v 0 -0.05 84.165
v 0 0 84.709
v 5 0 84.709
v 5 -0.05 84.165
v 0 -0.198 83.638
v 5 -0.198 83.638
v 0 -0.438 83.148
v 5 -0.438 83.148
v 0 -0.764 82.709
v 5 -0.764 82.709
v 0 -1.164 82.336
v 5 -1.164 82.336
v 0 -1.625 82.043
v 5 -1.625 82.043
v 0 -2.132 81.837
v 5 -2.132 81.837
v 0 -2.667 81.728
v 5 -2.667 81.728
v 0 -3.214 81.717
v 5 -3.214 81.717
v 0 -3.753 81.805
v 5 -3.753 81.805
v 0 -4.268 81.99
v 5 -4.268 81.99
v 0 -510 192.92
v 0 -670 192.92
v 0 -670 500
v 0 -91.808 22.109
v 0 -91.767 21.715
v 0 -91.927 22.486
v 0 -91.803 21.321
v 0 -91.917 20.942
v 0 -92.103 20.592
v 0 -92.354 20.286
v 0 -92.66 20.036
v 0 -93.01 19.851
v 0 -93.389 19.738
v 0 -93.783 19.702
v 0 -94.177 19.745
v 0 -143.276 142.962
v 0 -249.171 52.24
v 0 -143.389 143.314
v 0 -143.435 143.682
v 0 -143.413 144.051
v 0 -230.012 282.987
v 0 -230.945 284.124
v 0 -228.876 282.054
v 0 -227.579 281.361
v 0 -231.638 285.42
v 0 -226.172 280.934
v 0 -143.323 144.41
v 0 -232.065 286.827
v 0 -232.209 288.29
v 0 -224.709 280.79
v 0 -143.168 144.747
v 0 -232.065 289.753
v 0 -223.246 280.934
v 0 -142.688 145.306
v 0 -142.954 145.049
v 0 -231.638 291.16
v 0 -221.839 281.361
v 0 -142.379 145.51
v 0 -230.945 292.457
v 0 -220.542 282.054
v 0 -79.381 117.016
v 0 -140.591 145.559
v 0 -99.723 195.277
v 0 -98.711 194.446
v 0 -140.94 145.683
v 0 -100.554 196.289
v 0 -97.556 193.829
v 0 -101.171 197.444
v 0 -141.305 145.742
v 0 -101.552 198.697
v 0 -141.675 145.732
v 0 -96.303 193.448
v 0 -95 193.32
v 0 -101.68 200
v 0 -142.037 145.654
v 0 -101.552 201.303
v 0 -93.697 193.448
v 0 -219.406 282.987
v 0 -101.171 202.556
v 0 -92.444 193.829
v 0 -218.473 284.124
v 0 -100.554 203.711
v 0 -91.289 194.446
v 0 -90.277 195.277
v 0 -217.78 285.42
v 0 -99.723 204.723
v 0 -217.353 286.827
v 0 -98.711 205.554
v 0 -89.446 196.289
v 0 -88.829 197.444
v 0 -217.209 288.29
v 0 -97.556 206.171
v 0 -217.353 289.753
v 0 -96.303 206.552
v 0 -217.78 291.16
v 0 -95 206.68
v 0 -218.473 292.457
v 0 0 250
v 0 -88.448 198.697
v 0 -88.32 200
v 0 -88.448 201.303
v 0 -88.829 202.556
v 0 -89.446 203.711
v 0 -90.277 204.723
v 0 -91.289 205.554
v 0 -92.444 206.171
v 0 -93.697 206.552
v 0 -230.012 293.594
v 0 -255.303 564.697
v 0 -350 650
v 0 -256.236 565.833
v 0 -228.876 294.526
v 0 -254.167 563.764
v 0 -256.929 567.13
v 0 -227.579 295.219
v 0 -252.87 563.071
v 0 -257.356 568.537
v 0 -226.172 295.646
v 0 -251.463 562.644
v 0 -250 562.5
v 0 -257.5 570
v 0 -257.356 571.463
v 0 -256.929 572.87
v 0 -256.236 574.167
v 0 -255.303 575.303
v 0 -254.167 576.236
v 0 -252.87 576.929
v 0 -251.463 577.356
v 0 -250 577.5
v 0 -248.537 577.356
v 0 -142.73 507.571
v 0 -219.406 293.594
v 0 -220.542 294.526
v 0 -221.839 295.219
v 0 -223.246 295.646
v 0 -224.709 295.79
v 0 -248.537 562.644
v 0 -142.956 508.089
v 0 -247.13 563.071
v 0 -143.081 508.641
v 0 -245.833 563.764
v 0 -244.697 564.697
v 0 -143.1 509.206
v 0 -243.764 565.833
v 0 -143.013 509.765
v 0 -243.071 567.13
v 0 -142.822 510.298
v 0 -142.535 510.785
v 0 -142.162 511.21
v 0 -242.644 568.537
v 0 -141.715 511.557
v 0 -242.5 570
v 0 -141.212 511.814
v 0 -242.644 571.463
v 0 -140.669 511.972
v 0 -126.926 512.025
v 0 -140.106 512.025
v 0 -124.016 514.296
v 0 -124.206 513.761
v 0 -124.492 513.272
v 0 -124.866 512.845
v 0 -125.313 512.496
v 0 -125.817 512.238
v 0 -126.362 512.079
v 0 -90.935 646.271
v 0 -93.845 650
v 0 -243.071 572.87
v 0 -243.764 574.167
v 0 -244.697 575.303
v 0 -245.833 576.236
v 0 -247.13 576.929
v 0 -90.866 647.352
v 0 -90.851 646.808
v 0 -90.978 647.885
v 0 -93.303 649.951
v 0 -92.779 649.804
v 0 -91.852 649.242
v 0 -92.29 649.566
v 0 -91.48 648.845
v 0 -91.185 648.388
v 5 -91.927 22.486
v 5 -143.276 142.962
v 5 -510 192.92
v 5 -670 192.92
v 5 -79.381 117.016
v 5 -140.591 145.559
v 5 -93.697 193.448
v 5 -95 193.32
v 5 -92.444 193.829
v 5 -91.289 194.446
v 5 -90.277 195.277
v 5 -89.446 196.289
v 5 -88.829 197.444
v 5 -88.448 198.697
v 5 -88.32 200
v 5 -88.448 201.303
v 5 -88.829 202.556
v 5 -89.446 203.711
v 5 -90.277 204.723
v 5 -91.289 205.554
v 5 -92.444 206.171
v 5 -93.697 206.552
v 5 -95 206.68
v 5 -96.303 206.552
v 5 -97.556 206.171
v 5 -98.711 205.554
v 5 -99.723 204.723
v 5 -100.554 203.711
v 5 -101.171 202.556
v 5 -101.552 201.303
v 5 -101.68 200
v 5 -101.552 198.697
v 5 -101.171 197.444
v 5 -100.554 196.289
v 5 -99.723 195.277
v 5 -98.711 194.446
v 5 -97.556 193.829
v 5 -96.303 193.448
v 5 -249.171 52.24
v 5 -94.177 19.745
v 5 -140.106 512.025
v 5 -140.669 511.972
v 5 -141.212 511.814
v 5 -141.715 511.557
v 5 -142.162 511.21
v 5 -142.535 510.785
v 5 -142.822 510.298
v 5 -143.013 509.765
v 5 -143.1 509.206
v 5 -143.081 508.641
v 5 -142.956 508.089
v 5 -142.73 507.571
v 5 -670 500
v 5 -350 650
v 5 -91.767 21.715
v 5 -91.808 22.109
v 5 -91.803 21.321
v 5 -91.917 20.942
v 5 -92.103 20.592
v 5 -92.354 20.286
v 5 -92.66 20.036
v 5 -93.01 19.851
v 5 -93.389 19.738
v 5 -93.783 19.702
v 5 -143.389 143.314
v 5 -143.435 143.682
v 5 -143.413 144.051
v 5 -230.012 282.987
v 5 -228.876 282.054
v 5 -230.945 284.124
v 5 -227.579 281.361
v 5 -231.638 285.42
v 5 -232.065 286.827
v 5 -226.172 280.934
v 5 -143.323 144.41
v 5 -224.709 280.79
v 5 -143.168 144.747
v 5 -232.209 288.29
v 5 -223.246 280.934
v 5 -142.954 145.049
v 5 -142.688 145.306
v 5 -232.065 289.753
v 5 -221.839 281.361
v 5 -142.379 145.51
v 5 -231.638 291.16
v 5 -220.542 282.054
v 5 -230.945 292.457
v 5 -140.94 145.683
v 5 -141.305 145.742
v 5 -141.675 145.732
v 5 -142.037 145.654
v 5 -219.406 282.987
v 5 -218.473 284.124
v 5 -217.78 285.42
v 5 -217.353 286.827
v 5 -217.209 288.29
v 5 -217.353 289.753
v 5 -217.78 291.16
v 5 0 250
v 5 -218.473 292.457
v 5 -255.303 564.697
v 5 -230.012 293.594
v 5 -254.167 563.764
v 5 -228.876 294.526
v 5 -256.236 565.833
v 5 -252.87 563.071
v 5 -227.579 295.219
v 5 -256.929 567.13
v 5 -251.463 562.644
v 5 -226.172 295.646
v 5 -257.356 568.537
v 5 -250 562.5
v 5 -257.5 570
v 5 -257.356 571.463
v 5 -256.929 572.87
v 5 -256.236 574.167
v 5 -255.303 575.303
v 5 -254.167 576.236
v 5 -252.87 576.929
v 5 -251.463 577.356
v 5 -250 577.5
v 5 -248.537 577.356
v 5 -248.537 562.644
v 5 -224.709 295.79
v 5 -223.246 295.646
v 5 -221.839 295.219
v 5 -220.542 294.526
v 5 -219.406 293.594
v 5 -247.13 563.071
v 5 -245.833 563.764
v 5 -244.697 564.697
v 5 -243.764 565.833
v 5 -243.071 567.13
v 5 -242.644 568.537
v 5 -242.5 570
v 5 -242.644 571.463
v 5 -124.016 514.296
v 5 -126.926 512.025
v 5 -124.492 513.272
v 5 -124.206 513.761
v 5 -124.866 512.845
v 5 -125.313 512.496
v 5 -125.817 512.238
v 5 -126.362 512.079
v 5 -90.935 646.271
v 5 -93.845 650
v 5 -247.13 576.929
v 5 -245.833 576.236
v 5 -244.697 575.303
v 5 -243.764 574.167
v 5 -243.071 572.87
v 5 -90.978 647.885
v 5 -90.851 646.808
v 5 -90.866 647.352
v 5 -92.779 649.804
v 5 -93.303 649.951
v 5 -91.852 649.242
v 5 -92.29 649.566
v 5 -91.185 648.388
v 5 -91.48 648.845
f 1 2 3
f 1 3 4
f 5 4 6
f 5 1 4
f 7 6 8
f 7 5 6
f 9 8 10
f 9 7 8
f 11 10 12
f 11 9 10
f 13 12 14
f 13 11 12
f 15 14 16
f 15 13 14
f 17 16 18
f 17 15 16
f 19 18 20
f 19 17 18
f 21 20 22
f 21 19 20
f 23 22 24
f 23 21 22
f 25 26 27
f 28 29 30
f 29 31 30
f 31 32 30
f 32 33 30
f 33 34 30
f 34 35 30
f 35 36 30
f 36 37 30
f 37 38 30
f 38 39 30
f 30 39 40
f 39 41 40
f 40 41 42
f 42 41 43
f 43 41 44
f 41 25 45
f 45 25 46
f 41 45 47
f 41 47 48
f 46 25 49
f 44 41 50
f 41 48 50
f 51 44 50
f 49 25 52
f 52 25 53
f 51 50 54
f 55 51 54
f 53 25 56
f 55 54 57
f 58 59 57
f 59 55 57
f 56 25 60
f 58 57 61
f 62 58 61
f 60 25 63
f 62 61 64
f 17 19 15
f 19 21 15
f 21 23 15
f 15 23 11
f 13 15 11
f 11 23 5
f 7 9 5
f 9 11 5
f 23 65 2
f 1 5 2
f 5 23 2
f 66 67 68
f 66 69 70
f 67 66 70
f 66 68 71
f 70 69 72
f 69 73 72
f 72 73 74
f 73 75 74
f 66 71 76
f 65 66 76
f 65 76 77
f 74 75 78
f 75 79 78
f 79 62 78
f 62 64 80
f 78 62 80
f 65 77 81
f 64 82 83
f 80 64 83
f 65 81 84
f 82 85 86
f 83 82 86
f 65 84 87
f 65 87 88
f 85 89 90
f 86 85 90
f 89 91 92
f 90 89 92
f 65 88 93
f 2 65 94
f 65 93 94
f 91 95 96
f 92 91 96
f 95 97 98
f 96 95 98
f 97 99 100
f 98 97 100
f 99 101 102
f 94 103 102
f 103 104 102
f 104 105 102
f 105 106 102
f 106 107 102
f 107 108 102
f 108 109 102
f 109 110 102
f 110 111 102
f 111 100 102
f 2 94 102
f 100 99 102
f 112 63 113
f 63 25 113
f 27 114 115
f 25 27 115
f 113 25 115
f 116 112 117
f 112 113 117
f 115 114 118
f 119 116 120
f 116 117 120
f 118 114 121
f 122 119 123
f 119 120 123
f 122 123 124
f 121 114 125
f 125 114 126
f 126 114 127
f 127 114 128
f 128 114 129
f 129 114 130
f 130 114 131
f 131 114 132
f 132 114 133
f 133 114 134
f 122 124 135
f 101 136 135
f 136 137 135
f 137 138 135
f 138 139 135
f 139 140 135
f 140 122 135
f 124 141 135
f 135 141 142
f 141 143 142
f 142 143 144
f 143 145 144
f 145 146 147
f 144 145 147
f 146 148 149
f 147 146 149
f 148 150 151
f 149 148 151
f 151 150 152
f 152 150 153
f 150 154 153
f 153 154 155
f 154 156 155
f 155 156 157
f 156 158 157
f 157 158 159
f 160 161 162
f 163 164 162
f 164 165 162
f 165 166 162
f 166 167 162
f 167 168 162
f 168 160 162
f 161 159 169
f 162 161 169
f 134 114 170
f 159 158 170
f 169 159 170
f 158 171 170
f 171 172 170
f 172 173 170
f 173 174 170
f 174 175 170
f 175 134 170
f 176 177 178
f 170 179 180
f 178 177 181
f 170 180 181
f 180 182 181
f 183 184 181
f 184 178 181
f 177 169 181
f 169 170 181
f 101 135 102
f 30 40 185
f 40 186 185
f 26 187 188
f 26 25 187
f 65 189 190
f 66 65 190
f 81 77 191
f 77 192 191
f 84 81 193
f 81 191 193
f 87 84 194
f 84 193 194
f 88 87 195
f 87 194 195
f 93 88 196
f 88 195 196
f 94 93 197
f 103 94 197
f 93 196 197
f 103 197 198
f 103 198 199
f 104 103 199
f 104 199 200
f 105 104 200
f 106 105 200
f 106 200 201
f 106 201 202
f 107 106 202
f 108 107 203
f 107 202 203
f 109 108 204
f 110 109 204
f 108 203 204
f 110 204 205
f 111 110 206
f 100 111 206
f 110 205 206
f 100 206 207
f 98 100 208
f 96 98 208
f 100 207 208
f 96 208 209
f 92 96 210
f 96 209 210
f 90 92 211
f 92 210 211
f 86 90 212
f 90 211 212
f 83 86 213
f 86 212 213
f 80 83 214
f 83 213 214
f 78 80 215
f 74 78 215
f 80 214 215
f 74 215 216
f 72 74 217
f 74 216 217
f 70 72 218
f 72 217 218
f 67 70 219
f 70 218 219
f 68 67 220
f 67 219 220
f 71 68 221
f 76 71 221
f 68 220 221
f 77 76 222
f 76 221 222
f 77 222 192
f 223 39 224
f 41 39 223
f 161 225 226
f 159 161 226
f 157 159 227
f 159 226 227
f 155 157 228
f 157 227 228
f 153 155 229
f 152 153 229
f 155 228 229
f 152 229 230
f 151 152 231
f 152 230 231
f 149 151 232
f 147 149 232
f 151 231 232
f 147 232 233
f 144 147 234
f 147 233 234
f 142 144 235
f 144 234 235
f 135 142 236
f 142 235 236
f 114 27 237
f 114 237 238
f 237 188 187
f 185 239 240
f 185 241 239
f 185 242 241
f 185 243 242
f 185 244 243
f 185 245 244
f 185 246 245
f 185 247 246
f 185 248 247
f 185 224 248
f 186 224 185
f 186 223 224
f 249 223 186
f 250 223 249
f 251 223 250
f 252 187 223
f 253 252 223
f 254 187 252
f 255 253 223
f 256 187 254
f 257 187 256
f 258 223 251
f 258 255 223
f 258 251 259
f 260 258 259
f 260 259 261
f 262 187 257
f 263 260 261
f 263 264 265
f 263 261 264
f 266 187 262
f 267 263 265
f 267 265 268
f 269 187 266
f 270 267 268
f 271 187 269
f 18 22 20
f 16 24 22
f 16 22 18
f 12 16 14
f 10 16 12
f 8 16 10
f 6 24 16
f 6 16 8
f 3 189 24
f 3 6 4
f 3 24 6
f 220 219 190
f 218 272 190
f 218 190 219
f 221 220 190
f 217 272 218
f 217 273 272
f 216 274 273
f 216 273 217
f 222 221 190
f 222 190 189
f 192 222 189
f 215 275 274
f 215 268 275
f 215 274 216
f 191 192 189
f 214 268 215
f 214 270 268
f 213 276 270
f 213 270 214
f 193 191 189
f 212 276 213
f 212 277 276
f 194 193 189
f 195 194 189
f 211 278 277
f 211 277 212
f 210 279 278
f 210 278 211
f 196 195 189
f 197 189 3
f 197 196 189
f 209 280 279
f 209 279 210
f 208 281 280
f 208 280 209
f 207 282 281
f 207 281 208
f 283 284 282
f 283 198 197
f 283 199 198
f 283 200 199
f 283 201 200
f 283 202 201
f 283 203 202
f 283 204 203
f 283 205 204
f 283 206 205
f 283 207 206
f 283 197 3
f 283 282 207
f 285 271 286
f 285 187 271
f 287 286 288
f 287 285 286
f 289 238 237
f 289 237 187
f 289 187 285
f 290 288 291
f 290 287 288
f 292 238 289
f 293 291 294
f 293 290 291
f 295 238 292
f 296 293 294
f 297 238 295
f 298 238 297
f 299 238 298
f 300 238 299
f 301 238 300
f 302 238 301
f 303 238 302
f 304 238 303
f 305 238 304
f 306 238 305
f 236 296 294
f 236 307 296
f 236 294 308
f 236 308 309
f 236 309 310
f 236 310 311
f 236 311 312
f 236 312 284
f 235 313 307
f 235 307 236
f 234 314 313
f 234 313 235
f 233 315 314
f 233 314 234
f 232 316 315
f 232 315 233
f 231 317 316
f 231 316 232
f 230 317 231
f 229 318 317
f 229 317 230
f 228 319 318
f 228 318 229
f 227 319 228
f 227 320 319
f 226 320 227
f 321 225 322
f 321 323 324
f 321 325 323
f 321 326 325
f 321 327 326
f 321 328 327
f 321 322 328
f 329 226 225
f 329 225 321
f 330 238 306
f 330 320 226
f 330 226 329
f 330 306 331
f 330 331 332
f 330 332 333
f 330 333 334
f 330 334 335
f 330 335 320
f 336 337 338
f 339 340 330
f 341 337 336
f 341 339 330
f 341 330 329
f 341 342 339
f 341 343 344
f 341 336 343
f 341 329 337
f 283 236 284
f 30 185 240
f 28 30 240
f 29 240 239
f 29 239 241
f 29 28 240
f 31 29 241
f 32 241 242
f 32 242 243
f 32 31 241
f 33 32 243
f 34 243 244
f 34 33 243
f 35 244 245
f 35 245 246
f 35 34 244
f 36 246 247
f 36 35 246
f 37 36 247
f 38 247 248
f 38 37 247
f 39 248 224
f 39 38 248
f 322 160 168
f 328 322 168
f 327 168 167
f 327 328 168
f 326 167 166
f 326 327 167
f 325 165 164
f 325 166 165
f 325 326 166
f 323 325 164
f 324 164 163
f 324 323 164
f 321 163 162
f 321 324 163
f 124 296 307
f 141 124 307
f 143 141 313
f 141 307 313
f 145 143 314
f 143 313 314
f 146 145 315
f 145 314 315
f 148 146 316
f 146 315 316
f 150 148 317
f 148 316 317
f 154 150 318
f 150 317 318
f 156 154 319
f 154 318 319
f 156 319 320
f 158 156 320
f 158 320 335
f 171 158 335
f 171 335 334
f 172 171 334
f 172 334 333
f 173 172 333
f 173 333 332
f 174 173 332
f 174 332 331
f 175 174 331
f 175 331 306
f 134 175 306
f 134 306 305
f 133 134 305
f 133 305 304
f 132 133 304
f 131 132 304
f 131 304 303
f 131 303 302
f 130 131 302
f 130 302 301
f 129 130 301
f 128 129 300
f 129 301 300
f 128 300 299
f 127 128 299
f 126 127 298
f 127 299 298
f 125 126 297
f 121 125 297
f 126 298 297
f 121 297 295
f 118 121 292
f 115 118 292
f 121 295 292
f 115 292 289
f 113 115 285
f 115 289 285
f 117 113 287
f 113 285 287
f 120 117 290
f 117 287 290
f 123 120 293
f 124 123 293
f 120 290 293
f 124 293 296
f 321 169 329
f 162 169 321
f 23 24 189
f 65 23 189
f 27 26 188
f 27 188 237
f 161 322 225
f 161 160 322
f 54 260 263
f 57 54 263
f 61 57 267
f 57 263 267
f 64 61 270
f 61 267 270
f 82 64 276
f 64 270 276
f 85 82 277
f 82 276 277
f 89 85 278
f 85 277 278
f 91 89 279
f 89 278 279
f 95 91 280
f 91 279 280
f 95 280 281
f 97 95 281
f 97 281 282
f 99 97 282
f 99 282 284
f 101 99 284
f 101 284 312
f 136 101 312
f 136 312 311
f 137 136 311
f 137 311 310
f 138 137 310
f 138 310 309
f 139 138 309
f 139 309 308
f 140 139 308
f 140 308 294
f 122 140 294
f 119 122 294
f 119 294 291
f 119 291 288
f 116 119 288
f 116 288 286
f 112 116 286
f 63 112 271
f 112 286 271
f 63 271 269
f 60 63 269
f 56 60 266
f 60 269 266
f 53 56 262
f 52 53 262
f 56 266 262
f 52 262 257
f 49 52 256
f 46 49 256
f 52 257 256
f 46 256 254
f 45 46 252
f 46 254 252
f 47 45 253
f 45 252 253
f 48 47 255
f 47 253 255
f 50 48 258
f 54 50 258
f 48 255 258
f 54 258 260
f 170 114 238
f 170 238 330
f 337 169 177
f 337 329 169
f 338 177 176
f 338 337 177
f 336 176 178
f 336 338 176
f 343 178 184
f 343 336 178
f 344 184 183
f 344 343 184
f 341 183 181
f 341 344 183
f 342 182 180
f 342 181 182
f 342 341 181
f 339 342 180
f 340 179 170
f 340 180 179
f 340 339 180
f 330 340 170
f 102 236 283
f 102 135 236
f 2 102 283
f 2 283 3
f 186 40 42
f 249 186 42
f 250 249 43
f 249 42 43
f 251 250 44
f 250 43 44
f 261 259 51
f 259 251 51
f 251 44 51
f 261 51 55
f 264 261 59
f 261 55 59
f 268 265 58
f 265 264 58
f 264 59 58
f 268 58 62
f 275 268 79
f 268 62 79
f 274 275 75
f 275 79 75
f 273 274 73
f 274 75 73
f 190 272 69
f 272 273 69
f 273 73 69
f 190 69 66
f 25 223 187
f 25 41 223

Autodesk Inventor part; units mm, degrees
ref_plane "YZ Plane" through (0, 0, 0) normal (1, 0, 0) x (0, 1, 0)
ref_plane "XZ Plane" through (0, 0, 0) normal (0, 1, 0) x (-1, 0, 0)
ref_plane "XY Plane" through (0, 0, 0) normal (0, 0, 1) x (1, 0, 0)
sketch "スケッチ1" plane through (0, 0, 0) normal (1, 0, 0) x (0, 1, 0)
  line L0 (-670, 192.9198) -> (-670, 500)
  line L1 (-670, 500) -> (-350, 650)
  line L2 (-350, 650) -> (-90, 650)
  line L3 (0, 250) -> (0, 0)
  line L4 (-124.5856, 512.0252) -> (-145.1979, 512.0252)
  line L5 (-145.1979, 512.0252) -> (0, 250)
  line L6 (-90, 650) -> (-124.5856, 512.0252)
  line L7 (-249.1712, 52.2397) -> (-510, 192.9198)
  line L8 (-510, 192.9198) -> (-670, 192.9198)
  line L9 (0, 0) -> (-249.1712, 52.2397)
  dimension "d2" = 150
  dimension "d3" = 320
  dimension "d4" = 250
  dimension "d5" = 670
  dimension "d79" = 260
extrude "押し出し1" add sketch "スケッチ1" along normal blind 5
sketch "スケッチ8" plane through (5, 0, 0) normal (1, 0, 0) x (0, 0, -1)
  circle A0 centre (-570, -250) radius 7.5
  circle A1 centre (-288.2903, -224.7089) radius 7.5
  line L0 (0, 0) -> (-250, 0) projected
  line L1 (-570, -250) -> (-290.3837, -264.6541)
  line L2 (-290.3837, -264.6541) -> (-288.2903, -224.7089)
  line L3 (0, -804) -> (0, 134) projected
  dimension "d65" = 15
  dimension "d66" = 15
  dimension "d77" = 250
  dimension "d88" = 40
  dimension "d89" = 280
  dimension "d90" = 3
  dimension "d91" = 570
extrude "押し出し8" cut sketch "スケッチ8" against normal through all
sketch "スケッチ12" plane through (5, 0, 0) normal (1, 0, 0) x (0, 0, -1)
  circle A0 centre (-200, -95) radius 6.6799
  point P0 (0, 0)
  dimension "d84" = 200
  dimension "d85" = 95
extrude "押し出し11" cut sketch "スケッチ12" against normal through all
sketch "スケッチ13" plane through (5, 0, 0) normal (1, 0, 0) x (0, 0, -1)
  line L0 (0, -804) -> (0, 134) projected
  line L1 (130, 0) -> (-780, 0) projected
  line L2 (-80, 0) -> (-121.7476, -89.528)
  line L3 (-121.7476, -89.528) -> (-1.0516, -5.0157)
  line L4 (-52.2397, -249.1712) -> (0, 0) projected
  dimension "d95" = 80
  dimension "d96" = 115
  dimension "d97" = 30
extrude "押し出し12" cut sketch "スケッチ13" against normal through all
fillet "フィレット2" radius 3 6 edges at (2.5, -89.528, 121.7476) (2.5, -5.0157, 1.0516) (2.5, 0, 80) (2.5, -145.1979, 512.0252) (2.5, -124.5856, 512.0252) (2.5, -90, 650)
sketch "スケッチ14" plane through (5, 0, 0) normal (1, 0, 0) x (0, 0, -1)
  line L0 (-117.0159, -79.3808) -> (-81.9901, -4.2679) projected
  line L1 (-52.2397, -249.1712) -> (-2.608, -12.4393) projected
  line L2 (-7.2648, -9.3663) -> (-112.5762, -83.1061) projected
  line L3 (-81.9901, -4.2679) -> (-147.7654, -145.3235)
  line L4 (-147.7654, -145.3235) -> (-18.9575, -90.4227)
  line L5 (-52.2397, -249.1712) -> (-2.608, -12.4393) projected
  line L6 (-18.9575, -90.4227) -> (-2.608, -12.4393)
  line L7 (-2.608, -12.4393) -> (0, 0)
  line L8 (0, 0) -> (-81.9901, -4.2679)
extrude "押し出し13" cut sketch "スケッチ14" against normal through all
fillet "フィレット3" radius 2 2 edges at (2.5, -145.3235, 147.7654) (2.5, -90.4227, 18.9575)
properties part number "end_plate" material "木材 (オーク)"
